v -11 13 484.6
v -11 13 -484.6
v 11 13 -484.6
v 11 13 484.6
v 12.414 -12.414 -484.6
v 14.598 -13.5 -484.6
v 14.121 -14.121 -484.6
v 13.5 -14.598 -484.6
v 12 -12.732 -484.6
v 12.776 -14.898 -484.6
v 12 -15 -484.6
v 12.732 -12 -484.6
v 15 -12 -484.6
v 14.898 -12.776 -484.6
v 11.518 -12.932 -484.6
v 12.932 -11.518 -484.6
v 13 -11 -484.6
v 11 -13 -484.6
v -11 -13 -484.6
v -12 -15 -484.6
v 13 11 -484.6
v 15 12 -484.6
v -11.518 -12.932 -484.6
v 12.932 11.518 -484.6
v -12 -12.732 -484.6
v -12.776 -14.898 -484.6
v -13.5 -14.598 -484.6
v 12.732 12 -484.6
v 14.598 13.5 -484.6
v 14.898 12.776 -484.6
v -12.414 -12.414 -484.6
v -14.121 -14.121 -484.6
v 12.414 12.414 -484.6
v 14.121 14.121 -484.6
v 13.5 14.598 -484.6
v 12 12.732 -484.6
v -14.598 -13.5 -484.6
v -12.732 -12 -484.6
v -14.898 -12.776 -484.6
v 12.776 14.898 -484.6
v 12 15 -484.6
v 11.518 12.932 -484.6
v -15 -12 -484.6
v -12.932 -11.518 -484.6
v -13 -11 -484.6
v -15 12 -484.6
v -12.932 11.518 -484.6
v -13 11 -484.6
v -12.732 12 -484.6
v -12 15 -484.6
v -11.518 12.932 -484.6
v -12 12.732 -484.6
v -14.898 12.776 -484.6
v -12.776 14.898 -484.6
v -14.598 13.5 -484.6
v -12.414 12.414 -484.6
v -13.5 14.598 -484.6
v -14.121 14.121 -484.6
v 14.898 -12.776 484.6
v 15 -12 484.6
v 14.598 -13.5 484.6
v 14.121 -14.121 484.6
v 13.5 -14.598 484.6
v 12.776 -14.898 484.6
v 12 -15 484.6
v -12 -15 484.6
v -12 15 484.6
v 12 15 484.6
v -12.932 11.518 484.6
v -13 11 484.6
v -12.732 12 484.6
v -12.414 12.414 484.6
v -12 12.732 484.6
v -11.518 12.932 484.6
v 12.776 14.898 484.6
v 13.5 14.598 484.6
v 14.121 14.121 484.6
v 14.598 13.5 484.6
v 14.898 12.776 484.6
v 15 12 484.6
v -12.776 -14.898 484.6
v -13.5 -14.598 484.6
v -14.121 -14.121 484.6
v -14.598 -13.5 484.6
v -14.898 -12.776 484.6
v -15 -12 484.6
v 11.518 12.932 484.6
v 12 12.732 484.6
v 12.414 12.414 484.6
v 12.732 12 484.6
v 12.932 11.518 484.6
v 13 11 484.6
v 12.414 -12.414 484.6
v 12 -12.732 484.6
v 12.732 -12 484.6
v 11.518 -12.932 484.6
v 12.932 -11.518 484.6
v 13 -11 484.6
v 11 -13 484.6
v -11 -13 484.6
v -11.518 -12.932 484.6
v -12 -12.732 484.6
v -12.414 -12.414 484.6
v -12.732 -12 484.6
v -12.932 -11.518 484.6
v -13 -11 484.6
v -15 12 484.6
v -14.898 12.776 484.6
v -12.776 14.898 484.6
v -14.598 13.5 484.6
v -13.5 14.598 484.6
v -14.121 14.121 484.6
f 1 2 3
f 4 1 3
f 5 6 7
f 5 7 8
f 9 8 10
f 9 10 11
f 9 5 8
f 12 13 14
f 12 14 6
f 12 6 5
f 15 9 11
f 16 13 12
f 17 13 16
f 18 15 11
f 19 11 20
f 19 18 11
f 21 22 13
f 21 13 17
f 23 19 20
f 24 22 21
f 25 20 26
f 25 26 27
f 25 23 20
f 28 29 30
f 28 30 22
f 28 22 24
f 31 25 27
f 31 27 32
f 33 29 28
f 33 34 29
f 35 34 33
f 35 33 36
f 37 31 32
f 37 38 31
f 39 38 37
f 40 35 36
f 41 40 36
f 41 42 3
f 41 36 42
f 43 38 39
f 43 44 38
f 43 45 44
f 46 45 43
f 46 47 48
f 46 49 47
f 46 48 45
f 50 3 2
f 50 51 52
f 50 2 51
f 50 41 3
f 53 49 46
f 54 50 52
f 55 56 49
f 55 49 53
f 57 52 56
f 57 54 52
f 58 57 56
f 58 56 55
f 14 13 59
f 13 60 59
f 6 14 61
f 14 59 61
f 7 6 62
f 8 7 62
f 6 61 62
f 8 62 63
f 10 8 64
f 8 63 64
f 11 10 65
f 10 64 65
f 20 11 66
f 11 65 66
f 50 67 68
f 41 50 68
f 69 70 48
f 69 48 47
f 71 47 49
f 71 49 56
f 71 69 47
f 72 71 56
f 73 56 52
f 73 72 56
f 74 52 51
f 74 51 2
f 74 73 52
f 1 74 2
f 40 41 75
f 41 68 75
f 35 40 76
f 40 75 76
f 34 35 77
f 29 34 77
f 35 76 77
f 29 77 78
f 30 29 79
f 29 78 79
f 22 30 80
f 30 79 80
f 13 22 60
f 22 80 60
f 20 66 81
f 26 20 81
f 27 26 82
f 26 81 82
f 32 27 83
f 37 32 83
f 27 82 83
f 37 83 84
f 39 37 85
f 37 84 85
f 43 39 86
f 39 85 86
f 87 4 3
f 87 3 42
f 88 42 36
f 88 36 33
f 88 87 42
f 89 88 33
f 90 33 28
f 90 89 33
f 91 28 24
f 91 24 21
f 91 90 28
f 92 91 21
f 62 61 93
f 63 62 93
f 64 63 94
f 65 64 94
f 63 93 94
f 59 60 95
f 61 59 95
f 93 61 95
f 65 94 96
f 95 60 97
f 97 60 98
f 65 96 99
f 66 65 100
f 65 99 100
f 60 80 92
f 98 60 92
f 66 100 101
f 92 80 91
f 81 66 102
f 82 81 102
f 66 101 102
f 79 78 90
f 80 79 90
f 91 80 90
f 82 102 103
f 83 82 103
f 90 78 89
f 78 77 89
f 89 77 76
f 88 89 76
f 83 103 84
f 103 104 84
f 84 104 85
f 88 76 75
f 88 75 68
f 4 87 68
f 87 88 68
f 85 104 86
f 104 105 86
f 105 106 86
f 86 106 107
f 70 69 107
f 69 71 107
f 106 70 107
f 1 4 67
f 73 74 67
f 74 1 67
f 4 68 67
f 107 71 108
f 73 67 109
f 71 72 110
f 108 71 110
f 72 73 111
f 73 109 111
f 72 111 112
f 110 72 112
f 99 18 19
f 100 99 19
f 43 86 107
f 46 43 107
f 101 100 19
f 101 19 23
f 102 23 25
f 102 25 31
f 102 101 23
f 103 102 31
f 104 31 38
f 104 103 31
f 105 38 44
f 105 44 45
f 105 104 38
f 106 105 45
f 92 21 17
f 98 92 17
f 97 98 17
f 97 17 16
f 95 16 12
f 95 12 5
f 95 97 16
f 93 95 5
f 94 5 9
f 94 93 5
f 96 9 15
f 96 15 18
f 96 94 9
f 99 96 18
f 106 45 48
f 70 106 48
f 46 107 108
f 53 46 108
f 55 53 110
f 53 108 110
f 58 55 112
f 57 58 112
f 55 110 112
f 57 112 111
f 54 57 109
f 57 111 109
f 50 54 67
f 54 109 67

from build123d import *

# Parameters (mm, degrees)
EXTRUDE_1_DEPTH = 484.6


with BuildPart() as part:
    # Эскиз1 → Бобышка-Вытянуть1 (new body)
    with BuildSketch(Plane.XY):
        with BuildLine():
            Line((-12, 15), (12, 15))
            ThreePointArc((12, 15), (14.121320344, 14.121320344), (15, 12))
            Line((15, 12), (15, -12))
            ThreePointArc((15, -12), (14.121320344, -14.121320344), (12, -15))
            Line((12, -15), (-12, -15))
            ThreePointArc((-12, -15), (-14.121320344, -14.121320344), (-15, -12))
            Line((-15, -12), (-15, 12))
            ThreePointArc((-15, 12), (-14.121320344, 14.121320344), (-12, 15))
        make_face()
        with BuildLine():
            Line((-11, 13), (11, 13))
            ThreePointArc((11, 13), (12.414213562, 12.414213562), (13, 11))
            Line((13, 11), (13, -11))
            ThreePointArc((13, -11), (12.414213562, -12.414213562), (11, -13))
            Line((11, -13), (-11, -13))
            ThreePointArc((-11, -13), (-12.414213562, -12.414213562), (-13, -11))
            Line((-13, -11), (-13, 11))
            ThreePointArc((-13, 11), (-12.414213562, 12.414213562), (-11, 13))
        make_face(mode=Mode.SUBTRACT)
    extrude(amount=EXTRUDE_1_DEPTH)

    # Зеркальное отражение1: part across plane


with BuildPart() as part_1:
    add(part.part)
    add(part.part.mirror(Plane(origin=(-12, -12, 0), x_dir=(1, 0, 0), z_dir=(0, 0, 1))))


solid = part_1.part
